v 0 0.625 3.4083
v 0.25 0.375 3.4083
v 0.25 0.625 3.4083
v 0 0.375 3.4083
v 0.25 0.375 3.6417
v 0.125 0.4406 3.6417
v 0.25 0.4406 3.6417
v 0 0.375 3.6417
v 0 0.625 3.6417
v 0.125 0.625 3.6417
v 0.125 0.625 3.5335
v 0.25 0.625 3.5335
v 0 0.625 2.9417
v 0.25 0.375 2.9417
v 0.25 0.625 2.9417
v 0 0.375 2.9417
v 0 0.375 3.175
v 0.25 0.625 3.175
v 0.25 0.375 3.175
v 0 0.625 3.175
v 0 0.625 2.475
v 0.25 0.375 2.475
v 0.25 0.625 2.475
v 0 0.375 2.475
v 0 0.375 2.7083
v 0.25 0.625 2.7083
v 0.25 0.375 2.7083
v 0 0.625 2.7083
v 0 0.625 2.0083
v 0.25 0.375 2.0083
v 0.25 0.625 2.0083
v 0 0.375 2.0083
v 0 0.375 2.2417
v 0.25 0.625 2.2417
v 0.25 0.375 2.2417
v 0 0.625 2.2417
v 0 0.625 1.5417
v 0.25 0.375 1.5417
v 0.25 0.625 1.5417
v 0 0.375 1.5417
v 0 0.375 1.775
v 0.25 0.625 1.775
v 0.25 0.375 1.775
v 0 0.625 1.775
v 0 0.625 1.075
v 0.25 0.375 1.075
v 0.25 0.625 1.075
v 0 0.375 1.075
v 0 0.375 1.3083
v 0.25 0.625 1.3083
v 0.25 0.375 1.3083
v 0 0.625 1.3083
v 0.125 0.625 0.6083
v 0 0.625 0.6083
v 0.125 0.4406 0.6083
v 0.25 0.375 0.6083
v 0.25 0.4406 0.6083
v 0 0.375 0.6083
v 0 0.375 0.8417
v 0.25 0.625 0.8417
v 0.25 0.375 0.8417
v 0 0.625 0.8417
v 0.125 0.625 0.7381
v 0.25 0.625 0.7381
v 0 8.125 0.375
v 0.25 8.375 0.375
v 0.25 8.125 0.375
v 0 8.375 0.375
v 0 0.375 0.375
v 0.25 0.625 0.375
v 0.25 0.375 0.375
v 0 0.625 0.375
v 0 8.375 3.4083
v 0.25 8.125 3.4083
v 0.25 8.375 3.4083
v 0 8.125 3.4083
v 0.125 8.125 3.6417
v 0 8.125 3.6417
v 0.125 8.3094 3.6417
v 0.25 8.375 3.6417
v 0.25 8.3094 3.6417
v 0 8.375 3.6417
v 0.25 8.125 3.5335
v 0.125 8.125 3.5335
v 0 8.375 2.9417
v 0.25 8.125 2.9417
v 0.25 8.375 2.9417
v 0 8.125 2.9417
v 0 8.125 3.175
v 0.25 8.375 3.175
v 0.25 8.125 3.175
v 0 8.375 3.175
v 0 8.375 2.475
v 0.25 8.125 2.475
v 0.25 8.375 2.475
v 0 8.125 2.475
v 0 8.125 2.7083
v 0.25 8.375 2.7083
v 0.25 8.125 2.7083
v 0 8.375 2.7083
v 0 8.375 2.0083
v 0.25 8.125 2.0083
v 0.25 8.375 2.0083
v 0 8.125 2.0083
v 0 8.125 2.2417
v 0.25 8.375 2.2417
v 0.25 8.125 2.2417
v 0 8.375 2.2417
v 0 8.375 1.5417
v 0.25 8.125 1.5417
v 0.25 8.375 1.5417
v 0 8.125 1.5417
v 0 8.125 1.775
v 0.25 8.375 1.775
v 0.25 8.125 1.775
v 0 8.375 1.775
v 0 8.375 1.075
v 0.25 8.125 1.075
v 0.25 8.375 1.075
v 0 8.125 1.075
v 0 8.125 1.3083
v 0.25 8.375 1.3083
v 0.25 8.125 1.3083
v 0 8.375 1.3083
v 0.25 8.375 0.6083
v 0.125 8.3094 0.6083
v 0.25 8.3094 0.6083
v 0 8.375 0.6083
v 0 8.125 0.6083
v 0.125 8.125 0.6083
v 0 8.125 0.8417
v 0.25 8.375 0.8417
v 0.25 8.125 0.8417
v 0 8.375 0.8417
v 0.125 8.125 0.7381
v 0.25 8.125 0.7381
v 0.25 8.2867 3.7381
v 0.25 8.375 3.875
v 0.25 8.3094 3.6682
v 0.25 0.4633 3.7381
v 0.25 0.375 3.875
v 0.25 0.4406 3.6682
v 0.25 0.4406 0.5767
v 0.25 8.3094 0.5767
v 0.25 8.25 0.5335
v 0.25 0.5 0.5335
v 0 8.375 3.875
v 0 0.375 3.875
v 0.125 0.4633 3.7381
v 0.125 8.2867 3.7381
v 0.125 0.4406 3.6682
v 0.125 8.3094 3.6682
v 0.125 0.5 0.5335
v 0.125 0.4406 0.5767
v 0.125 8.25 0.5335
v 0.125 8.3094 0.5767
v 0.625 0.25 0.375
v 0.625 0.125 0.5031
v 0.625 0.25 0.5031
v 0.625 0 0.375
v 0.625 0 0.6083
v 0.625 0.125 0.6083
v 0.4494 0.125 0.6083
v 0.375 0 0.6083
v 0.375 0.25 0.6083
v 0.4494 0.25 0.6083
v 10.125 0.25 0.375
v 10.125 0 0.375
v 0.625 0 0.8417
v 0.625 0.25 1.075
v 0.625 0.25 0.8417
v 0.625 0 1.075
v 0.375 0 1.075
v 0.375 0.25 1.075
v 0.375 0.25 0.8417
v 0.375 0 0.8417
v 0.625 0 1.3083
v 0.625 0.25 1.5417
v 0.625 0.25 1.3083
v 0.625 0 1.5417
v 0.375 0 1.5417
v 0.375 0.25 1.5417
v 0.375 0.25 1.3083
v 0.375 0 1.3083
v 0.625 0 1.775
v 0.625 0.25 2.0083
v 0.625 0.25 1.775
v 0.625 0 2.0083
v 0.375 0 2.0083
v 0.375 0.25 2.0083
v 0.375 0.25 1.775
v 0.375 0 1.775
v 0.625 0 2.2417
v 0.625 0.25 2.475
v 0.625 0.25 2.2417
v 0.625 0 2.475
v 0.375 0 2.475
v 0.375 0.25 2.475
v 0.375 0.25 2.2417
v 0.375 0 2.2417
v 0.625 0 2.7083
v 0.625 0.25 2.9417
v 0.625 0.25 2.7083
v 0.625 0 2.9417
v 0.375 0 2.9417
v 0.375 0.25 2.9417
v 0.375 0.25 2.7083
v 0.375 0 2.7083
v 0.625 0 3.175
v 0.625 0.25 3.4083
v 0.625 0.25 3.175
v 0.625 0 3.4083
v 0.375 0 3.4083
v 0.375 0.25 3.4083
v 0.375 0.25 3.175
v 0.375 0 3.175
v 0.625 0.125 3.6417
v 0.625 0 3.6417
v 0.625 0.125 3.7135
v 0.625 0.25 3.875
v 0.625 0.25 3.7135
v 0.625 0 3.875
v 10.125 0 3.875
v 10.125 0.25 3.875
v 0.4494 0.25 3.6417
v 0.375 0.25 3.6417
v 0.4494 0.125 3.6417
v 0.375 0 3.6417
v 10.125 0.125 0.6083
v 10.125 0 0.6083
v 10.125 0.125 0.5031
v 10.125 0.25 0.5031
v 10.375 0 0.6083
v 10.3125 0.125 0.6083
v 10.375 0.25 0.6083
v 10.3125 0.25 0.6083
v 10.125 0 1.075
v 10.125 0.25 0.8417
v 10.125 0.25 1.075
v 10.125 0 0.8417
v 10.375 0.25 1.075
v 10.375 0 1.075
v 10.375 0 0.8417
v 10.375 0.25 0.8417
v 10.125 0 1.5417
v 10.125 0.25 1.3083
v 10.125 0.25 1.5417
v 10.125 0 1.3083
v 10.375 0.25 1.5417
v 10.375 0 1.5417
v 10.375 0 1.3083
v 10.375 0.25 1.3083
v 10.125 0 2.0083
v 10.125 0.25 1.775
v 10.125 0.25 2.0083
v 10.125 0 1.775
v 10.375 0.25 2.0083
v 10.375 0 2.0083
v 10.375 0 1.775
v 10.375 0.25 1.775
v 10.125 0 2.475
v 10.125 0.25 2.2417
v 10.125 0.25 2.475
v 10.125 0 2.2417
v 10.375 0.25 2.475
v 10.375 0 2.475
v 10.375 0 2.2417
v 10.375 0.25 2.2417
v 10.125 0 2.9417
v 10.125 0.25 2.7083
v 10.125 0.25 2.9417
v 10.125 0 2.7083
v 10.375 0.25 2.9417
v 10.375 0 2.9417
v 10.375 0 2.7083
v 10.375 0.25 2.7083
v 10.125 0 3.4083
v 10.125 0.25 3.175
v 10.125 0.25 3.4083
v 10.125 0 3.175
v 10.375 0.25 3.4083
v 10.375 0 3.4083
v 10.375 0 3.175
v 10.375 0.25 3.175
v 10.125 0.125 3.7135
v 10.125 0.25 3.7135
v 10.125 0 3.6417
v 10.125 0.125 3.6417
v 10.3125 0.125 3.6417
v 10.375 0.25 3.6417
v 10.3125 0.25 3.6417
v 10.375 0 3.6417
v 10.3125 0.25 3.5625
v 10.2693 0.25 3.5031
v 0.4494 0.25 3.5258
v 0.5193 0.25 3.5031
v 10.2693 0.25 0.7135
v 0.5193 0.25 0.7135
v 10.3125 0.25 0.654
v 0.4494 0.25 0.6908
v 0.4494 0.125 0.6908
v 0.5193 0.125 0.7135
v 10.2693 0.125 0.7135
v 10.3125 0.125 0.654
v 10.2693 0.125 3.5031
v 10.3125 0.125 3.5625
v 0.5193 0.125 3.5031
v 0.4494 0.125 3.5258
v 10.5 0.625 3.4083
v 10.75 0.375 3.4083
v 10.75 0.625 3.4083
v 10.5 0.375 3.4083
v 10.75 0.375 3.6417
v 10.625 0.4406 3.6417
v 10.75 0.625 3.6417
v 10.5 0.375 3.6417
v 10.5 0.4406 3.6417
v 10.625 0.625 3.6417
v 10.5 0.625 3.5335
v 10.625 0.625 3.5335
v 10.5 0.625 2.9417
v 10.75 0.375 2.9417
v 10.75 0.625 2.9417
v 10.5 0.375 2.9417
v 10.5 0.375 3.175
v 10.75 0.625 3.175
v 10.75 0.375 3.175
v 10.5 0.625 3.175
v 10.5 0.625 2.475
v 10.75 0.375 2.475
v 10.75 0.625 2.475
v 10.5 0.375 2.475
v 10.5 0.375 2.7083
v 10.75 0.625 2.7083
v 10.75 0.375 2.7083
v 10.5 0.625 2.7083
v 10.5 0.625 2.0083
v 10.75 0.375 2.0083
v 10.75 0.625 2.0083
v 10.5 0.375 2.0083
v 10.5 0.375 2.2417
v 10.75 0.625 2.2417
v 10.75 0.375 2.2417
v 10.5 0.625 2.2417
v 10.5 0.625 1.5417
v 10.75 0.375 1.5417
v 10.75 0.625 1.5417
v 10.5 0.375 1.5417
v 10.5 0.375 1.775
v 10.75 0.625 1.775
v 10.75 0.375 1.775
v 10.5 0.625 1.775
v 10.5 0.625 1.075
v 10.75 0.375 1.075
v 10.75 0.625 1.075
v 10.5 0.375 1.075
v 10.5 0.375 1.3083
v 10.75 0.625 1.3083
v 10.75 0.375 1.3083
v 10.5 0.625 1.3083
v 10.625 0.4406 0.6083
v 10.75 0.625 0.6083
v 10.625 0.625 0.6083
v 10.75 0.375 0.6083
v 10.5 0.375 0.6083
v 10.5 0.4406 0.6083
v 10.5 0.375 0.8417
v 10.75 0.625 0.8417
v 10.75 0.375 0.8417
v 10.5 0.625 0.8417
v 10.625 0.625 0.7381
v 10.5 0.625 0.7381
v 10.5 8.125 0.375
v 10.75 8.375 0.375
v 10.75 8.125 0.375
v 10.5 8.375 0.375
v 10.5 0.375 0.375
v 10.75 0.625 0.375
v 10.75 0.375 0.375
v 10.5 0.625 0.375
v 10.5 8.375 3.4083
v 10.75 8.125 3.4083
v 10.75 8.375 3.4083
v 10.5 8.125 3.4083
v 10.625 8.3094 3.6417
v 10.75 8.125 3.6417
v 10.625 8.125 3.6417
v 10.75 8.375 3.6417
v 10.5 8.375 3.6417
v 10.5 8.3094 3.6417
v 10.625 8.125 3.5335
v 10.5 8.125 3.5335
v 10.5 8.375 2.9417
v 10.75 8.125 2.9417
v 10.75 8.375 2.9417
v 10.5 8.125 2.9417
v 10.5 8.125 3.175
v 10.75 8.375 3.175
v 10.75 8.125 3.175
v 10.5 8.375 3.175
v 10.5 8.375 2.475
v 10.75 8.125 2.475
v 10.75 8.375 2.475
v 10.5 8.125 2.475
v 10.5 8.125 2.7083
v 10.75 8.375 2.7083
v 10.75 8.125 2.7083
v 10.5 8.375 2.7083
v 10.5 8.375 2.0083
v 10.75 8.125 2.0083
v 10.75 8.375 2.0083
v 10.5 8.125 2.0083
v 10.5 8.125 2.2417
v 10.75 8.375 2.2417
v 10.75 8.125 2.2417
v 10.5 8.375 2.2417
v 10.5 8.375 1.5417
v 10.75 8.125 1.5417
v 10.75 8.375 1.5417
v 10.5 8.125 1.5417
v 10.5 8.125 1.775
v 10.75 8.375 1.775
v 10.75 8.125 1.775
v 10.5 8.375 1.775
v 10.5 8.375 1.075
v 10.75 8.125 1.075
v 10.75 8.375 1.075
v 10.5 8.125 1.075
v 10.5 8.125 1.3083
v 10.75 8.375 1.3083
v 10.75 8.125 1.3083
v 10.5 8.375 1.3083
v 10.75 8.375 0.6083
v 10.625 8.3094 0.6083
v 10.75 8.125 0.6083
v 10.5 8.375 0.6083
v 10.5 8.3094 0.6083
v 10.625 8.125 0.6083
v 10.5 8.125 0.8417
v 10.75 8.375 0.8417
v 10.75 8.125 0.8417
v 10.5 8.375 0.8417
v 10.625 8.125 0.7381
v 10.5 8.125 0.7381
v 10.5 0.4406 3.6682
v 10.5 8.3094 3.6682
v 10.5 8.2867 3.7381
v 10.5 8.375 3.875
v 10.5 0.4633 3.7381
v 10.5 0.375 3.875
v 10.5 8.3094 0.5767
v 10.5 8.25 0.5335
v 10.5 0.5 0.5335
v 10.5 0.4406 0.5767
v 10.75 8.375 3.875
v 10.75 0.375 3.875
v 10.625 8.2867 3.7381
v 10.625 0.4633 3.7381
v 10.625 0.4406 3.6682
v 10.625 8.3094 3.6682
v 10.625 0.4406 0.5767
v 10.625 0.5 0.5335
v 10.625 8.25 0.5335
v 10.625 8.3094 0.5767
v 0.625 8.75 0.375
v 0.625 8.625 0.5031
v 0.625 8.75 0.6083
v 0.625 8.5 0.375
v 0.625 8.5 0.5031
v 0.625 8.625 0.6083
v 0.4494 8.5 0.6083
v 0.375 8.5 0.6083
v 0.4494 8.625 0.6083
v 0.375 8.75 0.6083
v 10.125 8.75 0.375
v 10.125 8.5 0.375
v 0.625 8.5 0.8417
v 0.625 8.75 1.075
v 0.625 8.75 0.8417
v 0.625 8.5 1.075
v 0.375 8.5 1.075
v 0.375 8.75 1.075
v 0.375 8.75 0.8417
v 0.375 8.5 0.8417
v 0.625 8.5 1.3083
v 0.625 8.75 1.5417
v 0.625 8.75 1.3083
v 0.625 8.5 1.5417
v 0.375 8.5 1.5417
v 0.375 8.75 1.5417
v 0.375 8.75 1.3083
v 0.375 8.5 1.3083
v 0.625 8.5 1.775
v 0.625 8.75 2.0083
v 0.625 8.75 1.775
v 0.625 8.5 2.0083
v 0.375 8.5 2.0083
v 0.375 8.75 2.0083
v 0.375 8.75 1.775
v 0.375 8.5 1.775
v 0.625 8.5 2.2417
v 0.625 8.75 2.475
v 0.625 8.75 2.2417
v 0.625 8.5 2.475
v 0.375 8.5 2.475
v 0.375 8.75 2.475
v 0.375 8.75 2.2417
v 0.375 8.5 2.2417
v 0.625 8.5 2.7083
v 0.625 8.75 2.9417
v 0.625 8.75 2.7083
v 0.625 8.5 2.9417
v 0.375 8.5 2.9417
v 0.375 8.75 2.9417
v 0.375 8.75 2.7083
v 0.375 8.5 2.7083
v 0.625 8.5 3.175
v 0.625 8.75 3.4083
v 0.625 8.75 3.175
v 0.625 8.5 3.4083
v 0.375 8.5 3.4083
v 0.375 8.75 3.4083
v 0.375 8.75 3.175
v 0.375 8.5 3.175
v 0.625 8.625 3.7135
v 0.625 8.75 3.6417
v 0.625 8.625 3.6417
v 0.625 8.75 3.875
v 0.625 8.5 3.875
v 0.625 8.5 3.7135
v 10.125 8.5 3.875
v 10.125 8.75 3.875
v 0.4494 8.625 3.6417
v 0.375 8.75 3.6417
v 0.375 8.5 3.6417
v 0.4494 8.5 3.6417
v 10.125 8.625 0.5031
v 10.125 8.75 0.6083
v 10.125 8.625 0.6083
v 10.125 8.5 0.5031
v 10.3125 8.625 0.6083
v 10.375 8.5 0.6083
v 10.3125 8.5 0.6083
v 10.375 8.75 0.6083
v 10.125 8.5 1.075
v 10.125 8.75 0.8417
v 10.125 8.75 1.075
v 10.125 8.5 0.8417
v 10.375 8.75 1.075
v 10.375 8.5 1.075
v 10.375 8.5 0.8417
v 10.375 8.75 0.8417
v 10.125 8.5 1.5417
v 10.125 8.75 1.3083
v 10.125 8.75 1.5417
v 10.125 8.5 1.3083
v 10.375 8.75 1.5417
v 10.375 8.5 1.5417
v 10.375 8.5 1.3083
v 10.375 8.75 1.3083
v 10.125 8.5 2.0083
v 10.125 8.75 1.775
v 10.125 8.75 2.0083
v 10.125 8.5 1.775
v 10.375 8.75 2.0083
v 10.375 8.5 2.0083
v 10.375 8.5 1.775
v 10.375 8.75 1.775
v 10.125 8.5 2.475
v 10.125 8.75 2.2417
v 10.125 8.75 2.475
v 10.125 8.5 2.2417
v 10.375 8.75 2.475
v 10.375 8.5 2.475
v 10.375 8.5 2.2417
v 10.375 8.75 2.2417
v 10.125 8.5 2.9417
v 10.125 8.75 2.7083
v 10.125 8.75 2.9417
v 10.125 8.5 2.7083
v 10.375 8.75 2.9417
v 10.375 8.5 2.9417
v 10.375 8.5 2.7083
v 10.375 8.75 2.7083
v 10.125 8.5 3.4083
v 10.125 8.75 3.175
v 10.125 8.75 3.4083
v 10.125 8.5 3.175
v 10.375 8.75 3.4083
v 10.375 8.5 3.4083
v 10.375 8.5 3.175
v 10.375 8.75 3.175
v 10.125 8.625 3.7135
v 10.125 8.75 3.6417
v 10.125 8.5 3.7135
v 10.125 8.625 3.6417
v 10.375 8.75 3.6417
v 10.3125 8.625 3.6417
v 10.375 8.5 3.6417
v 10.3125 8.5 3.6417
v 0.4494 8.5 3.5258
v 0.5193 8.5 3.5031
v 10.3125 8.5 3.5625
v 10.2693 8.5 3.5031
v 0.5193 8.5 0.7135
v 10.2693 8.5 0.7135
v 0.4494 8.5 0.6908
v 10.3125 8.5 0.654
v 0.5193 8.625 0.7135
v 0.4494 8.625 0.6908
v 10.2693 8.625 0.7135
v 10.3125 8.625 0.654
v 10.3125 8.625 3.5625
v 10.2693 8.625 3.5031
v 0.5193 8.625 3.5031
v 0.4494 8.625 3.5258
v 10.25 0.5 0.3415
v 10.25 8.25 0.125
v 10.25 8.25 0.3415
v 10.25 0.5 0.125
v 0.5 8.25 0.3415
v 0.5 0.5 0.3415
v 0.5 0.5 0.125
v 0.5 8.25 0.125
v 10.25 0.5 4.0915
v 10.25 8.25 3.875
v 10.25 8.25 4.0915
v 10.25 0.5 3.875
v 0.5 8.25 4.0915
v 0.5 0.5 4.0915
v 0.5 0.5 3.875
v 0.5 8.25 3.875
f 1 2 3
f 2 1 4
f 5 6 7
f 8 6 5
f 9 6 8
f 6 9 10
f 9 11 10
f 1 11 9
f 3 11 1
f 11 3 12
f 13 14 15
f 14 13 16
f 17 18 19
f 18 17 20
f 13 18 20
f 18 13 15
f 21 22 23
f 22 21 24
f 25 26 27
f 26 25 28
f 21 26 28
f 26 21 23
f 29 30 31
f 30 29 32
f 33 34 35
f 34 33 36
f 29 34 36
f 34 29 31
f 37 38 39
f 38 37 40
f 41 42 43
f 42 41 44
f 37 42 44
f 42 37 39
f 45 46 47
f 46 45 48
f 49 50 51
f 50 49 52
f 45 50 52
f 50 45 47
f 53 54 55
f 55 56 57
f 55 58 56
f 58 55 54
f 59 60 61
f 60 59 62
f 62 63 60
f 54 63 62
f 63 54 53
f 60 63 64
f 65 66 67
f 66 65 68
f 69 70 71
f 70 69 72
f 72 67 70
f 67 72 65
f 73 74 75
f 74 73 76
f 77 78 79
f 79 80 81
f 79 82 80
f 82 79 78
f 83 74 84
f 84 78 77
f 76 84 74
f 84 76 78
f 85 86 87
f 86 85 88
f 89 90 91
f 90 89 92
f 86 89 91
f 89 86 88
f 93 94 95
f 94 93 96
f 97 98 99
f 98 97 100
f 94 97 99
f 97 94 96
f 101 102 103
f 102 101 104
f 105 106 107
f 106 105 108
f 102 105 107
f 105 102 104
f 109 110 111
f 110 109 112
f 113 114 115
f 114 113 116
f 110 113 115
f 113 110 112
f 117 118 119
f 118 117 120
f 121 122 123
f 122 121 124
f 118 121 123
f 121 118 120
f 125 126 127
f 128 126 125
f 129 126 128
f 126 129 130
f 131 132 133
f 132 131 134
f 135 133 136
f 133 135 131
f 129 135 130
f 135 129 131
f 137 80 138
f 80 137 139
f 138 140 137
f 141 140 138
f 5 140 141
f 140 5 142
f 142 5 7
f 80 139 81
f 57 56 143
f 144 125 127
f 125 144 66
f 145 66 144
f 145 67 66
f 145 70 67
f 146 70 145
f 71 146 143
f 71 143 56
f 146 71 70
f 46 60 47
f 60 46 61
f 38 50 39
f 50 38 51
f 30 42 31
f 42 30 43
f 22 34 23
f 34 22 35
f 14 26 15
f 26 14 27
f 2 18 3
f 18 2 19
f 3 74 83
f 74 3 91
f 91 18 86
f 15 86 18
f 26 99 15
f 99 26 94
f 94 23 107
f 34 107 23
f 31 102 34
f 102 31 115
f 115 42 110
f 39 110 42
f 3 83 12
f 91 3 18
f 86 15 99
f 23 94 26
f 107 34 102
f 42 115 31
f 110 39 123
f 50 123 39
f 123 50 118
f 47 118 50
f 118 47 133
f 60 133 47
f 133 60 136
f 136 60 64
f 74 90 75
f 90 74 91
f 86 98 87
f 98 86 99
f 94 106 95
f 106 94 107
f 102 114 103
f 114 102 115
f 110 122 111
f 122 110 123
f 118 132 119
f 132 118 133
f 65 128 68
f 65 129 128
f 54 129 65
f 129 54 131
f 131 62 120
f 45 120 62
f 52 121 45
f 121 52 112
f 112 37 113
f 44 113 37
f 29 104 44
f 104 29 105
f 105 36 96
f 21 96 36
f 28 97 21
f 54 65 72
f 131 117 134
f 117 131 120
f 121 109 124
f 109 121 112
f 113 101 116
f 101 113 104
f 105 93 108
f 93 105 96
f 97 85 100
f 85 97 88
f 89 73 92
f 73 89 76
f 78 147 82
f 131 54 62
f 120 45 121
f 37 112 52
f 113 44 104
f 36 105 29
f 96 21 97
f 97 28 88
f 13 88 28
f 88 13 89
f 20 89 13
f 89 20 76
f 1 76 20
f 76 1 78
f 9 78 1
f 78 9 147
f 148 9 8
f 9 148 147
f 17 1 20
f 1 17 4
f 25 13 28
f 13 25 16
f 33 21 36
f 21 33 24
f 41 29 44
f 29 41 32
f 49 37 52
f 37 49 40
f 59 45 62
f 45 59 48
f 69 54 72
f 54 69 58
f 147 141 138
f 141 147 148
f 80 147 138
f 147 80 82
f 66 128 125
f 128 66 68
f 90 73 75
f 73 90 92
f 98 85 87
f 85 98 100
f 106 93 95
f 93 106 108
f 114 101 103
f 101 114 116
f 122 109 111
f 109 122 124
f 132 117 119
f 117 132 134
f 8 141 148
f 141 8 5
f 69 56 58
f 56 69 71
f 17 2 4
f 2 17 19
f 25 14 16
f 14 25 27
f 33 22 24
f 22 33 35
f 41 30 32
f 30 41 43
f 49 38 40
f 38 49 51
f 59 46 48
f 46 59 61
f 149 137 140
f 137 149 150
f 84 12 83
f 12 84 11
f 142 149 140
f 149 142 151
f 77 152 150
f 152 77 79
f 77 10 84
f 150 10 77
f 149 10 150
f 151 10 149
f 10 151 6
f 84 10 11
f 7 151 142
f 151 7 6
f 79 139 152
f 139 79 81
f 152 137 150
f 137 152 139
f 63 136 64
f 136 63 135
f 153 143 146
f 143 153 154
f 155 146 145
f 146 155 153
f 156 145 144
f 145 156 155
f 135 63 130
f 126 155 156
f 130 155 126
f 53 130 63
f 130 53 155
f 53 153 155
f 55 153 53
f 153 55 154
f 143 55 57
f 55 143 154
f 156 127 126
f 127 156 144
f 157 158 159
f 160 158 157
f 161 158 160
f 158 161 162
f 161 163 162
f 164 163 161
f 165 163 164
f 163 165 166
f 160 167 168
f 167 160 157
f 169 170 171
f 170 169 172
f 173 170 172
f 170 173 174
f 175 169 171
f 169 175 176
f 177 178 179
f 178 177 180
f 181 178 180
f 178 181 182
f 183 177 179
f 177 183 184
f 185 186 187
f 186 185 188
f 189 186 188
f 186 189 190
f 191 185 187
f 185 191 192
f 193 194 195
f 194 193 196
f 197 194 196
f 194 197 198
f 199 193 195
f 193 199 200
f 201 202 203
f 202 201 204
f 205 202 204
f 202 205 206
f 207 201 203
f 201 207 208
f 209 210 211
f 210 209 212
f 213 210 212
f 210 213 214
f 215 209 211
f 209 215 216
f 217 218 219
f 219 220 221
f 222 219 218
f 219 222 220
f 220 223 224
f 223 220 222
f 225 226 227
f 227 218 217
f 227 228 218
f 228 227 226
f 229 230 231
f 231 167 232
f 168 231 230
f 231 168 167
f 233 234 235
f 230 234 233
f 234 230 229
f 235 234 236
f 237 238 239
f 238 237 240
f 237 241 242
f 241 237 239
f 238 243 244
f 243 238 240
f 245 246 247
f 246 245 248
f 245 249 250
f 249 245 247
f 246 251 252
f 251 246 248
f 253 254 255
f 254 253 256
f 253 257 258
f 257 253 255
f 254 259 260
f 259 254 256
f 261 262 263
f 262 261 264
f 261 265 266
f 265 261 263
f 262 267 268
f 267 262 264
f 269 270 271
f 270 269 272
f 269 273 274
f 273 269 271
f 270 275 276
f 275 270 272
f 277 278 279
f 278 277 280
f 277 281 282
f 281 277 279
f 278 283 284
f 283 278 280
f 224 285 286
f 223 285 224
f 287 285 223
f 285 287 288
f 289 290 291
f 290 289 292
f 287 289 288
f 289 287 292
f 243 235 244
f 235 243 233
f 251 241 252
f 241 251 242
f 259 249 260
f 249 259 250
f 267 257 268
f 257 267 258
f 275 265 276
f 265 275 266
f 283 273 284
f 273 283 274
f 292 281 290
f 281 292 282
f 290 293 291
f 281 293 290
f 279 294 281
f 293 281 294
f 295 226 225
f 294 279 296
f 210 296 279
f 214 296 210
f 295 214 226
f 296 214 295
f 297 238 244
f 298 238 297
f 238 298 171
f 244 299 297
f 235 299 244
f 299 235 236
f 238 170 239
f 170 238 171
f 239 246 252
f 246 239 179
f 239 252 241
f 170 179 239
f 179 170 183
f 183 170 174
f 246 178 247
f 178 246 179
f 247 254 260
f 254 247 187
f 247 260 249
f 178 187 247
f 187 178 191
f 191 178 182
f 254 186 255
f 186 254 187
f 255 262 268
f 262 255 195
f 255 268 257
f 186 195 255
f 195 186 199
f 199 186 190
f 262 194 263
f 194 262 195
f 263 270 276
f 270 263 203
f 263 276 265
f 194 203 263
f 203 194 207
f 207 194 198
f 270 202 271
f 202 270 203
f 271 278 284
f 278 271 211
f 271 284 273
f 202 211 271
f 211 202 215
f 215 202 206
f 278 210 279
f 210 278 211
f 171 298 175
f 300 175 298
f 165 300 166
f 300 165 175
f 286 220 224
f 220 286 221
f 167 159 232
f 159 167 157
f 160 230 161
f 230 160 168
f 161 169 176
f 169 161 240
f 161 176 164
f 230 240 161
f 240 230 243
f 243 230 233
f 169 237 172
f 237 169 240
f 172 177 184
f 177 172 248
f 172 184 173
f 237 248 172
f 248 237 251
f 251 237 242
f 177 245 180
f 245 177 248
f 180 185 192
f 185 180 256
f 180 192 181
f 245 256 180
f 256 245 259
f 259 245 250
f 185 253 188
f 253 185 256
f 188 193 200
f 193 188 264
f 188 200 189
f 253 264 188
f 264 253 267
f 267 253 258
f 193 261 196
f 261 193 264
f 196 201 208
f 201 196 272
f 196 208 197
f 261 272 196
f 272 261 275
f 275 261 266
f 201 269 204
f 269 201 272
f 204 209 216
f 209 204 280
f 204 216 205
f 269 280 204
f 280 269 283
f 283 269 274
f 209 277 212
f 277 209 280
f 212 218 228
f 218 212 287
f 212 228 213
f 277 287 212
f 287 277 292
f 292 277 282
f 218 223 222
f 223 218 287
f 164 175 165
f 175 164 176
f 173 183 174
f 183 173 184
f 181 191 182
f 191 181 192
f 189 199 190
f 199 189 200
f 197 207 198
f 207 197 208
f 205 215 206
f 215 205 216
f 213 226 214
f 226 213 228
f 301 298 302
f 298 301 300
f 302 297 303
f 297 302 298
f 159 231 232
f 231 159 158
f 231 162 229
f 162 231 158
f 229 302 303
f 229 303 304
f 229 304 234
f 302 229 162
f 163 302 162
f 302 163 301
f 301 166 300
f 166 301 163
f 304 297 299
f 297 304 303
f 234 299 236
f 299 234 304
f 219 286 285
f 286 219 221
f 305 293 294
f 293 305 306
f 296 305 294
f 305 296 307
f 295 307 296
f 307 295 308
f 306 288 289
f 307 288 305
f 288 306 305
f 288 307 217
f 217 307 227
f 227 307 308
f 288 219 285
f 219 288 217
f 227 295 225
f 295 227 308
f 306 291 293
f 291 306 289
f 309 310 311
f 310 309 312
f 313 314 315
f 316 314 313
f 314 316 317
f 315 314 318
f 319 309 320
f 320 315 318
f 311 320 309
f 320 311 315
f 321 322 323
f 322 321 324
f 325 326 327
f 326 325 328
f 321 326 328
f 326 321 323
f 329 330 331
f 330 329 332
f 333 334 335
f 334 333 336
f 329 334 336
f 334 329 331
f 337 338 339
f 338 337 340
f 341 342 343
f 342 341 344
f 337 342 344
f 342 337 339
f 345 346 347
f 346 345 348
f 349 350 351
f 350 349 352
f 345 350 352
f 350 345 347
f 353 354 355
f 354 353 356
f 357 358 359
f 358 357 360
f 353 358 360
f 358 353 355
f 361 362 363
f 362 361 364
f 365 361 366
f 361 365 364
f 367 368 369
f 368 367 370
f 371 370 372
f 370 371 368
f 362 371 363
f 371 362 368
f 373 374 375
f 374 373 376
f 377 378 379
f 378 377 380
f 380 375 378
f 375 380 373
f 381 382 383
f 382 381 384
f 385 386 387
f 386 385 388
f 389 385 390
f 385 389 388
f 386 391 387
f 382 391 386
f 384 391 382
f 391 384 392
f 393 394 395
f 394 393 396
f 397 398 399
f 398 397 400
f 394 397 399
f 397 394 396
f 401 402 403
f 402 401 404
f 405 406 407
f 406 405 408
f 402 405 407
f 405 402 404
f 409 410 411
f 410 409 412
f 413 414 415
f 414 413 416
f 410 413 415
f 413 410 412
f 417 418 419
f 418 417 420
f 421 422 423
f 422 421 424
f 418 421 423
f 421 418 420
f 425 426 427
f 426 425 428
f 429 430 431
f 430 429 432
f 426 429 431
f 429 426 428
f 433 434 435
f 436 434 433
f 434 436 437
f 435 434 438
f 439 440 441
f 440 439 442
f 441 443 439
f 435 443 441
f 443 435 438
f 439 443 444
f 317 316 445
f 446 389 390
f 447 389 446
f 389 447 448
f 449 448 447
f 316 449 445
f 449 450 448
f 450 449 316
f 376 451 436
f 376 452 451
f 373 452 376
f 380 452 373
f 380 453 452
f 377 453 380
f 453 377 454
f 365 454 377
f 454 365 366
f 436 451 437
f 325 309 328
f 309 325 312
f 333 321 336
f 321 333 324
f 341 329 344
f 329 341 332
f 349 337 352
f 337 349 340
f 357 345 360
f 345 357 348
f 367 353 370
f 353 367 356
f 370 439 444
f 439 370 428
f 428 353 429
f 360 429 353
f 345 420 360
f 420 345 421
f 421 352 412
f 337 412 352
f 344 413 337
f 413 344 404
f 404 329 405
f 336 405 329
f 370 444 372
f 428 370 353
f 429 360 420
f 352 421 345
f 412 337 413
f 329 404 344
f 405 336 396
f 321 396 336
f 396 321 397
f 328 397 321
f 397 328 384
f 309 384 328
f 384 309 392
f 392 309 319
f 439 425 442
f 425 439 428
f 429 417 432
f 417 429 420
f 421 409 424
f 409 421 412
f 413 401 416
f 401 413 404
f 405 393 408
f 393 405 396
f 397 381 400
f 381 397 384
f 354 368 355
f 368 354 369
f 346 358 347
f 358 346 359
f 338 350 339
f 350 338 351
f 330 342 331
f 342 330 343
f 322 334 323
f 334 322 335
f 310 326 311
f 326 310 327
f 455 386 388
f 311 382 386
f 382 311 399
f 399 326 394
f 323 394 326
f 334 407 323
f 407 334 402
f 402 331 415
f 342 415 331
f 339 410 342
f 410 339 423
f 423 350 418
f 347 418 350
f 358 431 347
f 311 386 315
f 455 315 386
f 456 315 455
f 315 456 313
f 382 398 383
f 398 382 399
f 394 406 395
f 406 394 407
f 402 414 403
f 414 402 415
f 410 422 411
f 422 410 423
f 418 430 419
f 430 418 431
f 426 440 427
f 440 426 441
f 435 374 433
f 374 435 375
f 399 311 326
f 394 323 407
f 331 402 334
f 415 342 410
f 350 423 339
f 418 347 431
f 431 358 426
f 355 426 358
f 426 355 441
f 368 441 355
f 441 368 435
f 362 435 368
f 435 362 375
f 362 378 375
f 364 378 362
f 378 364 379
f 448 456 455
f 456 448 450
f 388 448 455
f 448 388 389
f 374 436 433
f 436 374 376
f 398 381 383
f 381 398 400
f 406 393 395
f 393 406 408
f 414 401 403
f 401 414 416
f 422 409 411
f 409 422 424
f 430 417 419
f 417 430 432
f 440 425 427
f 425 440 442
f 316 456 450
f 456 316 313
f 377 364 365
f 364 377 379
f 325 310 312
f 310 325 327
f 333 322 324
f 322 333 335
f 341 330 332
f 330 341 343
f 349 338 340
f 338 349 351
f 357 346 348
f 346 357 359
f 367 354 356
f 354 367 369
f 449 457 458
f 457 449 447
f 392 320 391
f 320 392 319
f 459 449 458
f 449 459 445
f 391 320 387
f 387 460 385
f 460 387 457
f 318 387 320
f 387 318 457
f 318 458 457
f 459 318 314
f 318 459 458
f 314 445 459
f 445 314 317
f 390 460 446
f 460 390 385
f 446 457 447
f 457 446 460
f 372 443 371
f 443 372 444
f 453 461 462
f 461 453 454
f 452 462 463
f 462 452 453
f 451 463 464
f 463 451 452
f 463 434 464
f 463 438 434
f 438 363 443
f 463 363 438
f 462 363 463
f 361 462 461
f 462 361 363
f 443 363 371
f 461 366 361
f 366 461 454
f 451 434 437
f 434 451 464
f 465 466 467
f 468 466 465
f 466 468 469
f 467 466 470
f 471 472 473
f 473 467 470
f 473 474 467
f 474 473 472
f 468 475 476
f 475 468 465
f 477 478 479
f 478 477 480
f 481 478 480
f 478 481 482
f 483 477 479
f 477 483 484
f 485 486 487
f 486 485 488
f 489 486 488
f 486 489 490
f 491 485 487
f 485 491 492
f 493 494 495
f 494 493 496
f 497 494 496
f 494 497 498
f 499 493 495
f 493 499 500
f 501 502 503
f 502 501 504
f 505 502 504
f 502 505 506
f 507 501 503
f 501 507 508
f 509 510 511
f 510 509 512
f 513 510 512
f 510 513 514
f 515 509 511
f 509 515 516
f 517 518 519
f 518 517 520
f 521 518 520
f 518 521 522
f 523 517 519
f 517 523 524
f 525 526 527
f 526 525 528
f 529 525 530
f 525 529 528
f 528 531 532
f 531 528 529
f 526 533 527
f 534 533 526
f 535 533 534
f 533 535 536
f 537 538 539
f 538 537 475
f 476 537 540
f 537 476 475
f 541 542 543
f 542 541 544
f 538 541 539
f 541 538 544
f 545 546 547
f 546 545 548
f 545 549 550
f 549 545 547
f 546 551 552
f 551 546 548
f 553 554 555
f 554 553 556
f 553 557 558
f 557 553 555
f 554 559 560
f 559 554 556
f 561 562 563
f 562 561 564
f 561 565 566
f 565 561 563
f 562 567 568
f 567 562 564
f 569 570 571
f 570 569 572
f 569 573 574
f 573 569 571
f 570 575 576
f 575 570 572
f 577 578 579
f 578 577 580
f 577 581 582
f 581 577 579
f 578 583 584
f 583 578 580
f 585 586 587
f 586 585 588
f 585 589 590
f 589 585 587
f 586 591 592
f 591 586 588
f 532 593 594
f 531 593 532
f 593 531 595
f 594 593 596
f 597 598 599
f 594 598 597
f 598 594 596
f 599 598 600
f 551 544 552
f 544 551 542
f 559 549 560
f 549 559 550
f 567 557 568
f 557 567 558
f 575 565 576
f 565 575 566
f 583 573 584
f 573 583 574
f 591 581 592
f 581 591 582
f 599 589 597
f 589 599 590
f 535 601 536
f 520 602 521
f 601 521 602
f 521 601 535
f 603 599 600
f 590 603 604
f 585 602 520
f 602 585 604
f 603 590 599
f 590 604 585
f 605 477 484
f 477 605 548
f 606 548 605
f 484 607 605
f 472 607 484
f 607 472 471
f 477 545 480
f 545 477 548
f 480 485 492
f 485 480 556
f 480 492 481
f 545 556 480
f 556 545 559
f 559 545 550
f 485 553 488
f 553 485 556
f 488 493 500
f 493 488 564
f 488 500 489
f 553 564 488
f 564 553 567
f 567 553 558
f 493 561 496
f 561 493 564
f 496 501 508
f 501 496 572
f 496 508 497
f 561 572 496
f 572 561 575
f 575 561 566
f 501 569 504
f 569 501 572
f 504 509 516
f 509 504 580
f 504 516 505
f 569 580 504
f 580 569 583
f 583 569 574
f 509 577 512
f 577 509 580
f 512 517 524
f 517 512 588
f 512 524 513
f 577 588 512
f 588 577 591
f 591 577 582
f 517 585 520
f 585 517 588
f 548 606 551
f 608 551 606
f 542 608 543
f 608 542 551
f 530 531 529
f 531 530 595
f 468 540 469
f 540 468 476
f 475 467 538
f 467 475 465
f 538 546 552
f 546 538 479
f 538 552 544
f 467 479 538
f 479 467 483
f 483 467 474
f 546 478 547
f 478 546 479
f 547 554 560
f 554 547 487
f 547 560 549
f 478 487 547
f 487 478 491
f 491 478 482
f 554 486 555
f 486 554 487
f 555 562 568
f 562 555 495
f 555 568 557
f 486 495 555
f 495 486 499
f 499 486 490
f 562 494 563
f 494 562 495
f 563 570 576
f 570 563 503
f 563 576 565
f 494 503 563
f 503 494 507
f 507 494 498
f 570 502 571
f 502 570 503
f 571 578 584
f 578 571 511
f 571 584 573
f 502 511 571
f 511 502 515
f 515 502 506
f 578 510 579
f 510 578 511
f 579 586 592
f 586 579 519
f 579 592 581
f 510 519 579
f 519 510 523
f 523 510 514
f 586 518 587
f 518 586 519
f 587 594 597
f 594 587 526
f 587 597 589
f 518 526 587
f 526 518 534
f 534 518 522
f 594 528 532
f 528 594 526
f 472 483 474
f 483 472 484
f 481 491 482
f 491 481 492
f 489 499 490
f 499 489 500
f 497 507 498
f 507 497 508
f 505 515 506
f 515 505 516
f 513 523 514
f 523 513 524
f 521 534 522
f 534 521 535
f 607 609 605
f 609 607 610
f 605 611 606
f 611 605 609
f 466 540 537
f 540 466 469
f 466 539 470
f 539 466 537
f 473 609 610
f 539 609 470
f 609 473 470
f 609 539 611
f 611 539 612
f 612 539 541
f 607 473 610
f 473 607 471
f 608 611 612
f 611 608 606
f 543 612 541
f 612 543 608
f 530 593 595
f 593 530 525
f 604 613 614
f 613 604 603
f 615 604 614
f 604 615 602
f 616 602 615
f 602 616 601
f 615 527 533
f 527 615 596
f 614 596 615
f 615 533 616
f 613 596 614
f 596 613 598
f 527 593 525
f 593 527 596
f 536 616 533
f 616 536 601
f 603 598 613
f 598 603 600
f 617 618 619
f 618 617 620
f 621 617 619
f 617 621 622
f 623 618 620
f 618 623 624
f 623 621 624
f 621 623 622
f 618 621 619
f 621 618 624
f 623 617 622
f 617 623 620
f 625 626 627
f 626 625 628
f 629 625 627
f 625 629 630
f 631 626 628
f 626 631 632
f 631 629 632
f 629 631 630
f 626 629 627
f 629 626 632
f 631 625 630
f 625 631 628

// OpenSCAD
//!OpenSCAD

Height = 3.5;
Width = 10;
Depth = 8;
Stock_Thickness = 0.25;
Top_Bottom_Thickness = 0.21653543;
Part_Spacing = 0.375;
//(millimeters or inches)
Units = 1; //[1:millimeters, 25.4:inches]
Preview_3D = true;
Joinery_Cut = false;
Generate_DXF = false;
Endmill_Diameter = 0.125;


h = Height * Units;
w = Width * Units;
d = Depth * Units;
st = Stock_Thickness * Units;
tbt = Top_Bottom_Thickness * Units;
ps = Part_Spacing * Units;
cd = Endmill_Diameter * Units;
fjcount = (ceil(Height / Stock_Thickness) / 2) * 2 + 1;
fjsize = h / fjcount;

module board(ht, wd, dpth) {
  cube([wd, dpth, ht], center=false);
}

module topbottom() {
  board(tbt, w - st, d - st);
}

module cut(cbx, cby, cex, cey, abx, aby, aex, aey, sd, ed) {
  translate([0, 0, (sd - ed)]){
    hull(){
      translate([cbx, cby, 0]){
        em();
      }
      translate([cex, cey, 0]){
        em();
      }
      translate([abx, aby, 0]){
        em();
      }
      translate([aex, aey, 0]){
        em();
      }
    }
  }
}

module em() {
  cylinder(r1=(cd / 2), r2=(cd / 2), h=(cd + st), center=false);
}

module frontback() {
  difference() {
    board(st, w, h);

    cut(st / 2, st / 2 + cd / 2, w - st / 2, st / 2 + cd / 2, st / 2, (st / 2 + tbt) - cd / 2, w - st / 2, (st / 2 + tbt) - cd / 2, st, st / 2);
    translate([0, (h - st * 2), 0]){
      cut(st / 2, st / 2 + cd / 2, w - st / 2, st / 2 + cd / 2, st / 2, (st / 2 + tbt) - cd / 2, w - st / 2, (st / 2 + tbt) - cd / 2, st, st / 2);
    }
    if (Generate_DXF == false) {
      union(){
        translate([(-cd), 0, (-st)]){
          for (i = [0 : abs(2) : fjcount - 1]) {
            translate([0, (i * fjsize), 0]){
              cube([(cd + st), fjsize, (st * 3)], center=false);
            }
          }

        }
        translate([(w - st), 0, (-st)]){
          for (i = [0 : abs(2) : fjcount - 1]) {
            translate([0, (i * fjsize), 0]){
              cube([(cd + st), fjsize, (st * 3)], center=false);
            }
          }

        }
      }
    }

  }
}

module sides() {
  difference() {
    board(st, h, d);

    cut(st / 2 + cd / 2, st / 2, st / 2 + cd / 2, d - st / 2, (st / 2 + tbt) - cd / 2, st / 2, (st / 2 + tbt) - cd / 2, d - st / 2, st, st / 2);
    translate([(h - st * 2), 0, 0]){
      cut(st / 2 + cd / 2, st / 2, st / 2 + cd / 2, d - st / 2, (st / 2 + tbt) - cd / 2, st / 2, (st / 2 + tbt) - cd / 2, d - st / 2, st, st / 2);
    }
    if (Generate_DXF == false) {
      union(){
        translate([0, (-cd), (-st)]){
          for (i = [1 : abs(2) : fjcount]) {
            translate([(i * fjsize), 0, 0]){
              cube([fjsize, (cd + st), (st * 3)], center=false);
            }
          }

        }
        translate([0, (d - st), (-st)]){
          for (i = [1 : abs(2) : fjcount]) {
            translate([(i * fjsize), 0, 0]){
              cube([fjsize, (cd + st), (st * 3)], center=false);
            }
          }

        }
      }
    }

  }
}

if (Preview_3D == false) {
    projection(cut = true)
    {
  union(){
    translate([0, (h + ps), -st*0.9]){
      sides();
    }
    translate([(h + ps), 0, -st*0.9]){
      frontback();
    }
    translate([((h + ps) + st / 2), ((h + ps) + st / 2), 0]){
      topbottom();
    }
    translate([(h + ps), ((h + ps) + (d + ps)), -st*0.9]){
      frontback();
    }
    translate([((h + ps) + (w + ps)), (h + ps), -st*0.9]){
      sides();
    }
  }
}} else {
  if (Joinery_Cut == false) {
    union(){
      translate([0, ps, (h + ps)]){
        rotate([0, 90, 0]){
          sides();
        }
      }
      translate([0, 0, 0]){
        mirror([0,1,0]){
          translate([ps, 0, ps]){
            rotate([90, 0, 0]){
              frontback();
            }
          }
        }
      }
      translate([(ps + st / 2), (ps + st / 2), (st / 2)]){
        topbottom();
      }
      translate([(ps + st / 2), (ps + st / 2), ((h + ps * 2) - st * 1.5)]){
        topbottom();
      }
      translate([((w + ps * 2) - 0), ps, (h + ps)]){
        rotate([0, 90, 0]){
          mirror([0,0,1]){
            sides();
          }
        }
      }
      translate([ps, (d + ps * 2), ps]){
        rotate([90, 0, 0]){
          frontback();
        }
      }
    }
  } else {
    if (Generate_DXF == true) {
        projection(){
      union(){
        cube([(cd / 2), (cd / 2), (cd / 2)], center=false);
        translate([fjsize, (-(cd / 2)), 0]){
          for (j = [0 : abs(2) : fjcount]) {
            translate([(j * fjsize), 0, 0]){
              cube([fjsize, ((st * 4 + ps * 3) + cd), (st * 2)], center=false);
            }
          }

        }
      }
    }} else {
      difference() {
        union(){
          translate([0, st, (st - d)]){
            rotate([90, 0, 0]){
              union(){
                sides();
                translate([0, 0, (-(st + ps))]){
                  sides();
                }
              }
            }
          }
          translate([fjsize, ((st + ps) * 2 + st), st]){
            rotate([90, 90, 0]){
              union(){
                frontback();
                translate([0, 0, (-(st + ps))]){
                  frontback();
                }
              }
            }
          }
        }

        translate([fjsize, (-(cd / 2)), 0]){
          for (j = [0 : abs(2) : fjcount]) {
            translate([(j * fjsize), 0, 0]){
              cube([fjsize, ((st * 4 + ps * 3) + cd), (st * 2)], center=false);
            }
          }

        }
      }
    }

  }

}
